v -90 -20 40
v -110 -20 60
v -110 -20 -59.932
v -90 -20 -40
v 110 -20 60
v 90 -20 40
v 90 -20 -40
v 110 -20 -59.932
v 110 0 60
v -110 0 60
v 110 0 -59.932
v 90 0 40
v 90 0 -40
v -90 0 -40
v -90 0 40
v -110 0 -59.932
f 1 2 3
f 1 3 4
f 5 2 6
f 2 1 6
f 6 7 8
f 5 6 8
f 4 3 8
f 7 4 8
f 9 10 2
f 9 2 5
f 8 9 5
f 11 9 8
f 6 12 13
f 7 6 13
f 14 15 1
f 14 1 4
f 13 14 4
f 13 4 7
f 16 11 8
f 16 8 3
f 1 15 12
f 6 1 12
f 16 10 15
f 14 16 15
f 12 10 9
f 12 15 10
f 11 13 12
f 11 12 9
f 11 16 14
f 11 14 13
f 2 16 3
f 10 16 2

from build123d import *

# Parameters (mm, degrees)
SKETCH_1_W      = 180
SKETCH_1_H      = 80
EXTRUDE_1_DEPTH = 20


with BuildPart() as part:
    # 草图1 → 凸台-拉伸1 (new body)
    with BuildSketch(Plane(origin=(0, 0, 0), x_dir=(1, 0, 0), z_dir=(0, 1, 0))):
        Polygon((-110, -40), (-110, -60), (110, -60), (110, -40), (110, 40), (110, 59.931716483), (-110, 59.931716483), (-110, 40), align=None)
        Rectangle(SKETCH_1_W, SKETCH_1_H, mode=Mode.SUBTRACT)
    extrude(amount=-EXTRUDE_1_DEPTH)


solid = part.part
